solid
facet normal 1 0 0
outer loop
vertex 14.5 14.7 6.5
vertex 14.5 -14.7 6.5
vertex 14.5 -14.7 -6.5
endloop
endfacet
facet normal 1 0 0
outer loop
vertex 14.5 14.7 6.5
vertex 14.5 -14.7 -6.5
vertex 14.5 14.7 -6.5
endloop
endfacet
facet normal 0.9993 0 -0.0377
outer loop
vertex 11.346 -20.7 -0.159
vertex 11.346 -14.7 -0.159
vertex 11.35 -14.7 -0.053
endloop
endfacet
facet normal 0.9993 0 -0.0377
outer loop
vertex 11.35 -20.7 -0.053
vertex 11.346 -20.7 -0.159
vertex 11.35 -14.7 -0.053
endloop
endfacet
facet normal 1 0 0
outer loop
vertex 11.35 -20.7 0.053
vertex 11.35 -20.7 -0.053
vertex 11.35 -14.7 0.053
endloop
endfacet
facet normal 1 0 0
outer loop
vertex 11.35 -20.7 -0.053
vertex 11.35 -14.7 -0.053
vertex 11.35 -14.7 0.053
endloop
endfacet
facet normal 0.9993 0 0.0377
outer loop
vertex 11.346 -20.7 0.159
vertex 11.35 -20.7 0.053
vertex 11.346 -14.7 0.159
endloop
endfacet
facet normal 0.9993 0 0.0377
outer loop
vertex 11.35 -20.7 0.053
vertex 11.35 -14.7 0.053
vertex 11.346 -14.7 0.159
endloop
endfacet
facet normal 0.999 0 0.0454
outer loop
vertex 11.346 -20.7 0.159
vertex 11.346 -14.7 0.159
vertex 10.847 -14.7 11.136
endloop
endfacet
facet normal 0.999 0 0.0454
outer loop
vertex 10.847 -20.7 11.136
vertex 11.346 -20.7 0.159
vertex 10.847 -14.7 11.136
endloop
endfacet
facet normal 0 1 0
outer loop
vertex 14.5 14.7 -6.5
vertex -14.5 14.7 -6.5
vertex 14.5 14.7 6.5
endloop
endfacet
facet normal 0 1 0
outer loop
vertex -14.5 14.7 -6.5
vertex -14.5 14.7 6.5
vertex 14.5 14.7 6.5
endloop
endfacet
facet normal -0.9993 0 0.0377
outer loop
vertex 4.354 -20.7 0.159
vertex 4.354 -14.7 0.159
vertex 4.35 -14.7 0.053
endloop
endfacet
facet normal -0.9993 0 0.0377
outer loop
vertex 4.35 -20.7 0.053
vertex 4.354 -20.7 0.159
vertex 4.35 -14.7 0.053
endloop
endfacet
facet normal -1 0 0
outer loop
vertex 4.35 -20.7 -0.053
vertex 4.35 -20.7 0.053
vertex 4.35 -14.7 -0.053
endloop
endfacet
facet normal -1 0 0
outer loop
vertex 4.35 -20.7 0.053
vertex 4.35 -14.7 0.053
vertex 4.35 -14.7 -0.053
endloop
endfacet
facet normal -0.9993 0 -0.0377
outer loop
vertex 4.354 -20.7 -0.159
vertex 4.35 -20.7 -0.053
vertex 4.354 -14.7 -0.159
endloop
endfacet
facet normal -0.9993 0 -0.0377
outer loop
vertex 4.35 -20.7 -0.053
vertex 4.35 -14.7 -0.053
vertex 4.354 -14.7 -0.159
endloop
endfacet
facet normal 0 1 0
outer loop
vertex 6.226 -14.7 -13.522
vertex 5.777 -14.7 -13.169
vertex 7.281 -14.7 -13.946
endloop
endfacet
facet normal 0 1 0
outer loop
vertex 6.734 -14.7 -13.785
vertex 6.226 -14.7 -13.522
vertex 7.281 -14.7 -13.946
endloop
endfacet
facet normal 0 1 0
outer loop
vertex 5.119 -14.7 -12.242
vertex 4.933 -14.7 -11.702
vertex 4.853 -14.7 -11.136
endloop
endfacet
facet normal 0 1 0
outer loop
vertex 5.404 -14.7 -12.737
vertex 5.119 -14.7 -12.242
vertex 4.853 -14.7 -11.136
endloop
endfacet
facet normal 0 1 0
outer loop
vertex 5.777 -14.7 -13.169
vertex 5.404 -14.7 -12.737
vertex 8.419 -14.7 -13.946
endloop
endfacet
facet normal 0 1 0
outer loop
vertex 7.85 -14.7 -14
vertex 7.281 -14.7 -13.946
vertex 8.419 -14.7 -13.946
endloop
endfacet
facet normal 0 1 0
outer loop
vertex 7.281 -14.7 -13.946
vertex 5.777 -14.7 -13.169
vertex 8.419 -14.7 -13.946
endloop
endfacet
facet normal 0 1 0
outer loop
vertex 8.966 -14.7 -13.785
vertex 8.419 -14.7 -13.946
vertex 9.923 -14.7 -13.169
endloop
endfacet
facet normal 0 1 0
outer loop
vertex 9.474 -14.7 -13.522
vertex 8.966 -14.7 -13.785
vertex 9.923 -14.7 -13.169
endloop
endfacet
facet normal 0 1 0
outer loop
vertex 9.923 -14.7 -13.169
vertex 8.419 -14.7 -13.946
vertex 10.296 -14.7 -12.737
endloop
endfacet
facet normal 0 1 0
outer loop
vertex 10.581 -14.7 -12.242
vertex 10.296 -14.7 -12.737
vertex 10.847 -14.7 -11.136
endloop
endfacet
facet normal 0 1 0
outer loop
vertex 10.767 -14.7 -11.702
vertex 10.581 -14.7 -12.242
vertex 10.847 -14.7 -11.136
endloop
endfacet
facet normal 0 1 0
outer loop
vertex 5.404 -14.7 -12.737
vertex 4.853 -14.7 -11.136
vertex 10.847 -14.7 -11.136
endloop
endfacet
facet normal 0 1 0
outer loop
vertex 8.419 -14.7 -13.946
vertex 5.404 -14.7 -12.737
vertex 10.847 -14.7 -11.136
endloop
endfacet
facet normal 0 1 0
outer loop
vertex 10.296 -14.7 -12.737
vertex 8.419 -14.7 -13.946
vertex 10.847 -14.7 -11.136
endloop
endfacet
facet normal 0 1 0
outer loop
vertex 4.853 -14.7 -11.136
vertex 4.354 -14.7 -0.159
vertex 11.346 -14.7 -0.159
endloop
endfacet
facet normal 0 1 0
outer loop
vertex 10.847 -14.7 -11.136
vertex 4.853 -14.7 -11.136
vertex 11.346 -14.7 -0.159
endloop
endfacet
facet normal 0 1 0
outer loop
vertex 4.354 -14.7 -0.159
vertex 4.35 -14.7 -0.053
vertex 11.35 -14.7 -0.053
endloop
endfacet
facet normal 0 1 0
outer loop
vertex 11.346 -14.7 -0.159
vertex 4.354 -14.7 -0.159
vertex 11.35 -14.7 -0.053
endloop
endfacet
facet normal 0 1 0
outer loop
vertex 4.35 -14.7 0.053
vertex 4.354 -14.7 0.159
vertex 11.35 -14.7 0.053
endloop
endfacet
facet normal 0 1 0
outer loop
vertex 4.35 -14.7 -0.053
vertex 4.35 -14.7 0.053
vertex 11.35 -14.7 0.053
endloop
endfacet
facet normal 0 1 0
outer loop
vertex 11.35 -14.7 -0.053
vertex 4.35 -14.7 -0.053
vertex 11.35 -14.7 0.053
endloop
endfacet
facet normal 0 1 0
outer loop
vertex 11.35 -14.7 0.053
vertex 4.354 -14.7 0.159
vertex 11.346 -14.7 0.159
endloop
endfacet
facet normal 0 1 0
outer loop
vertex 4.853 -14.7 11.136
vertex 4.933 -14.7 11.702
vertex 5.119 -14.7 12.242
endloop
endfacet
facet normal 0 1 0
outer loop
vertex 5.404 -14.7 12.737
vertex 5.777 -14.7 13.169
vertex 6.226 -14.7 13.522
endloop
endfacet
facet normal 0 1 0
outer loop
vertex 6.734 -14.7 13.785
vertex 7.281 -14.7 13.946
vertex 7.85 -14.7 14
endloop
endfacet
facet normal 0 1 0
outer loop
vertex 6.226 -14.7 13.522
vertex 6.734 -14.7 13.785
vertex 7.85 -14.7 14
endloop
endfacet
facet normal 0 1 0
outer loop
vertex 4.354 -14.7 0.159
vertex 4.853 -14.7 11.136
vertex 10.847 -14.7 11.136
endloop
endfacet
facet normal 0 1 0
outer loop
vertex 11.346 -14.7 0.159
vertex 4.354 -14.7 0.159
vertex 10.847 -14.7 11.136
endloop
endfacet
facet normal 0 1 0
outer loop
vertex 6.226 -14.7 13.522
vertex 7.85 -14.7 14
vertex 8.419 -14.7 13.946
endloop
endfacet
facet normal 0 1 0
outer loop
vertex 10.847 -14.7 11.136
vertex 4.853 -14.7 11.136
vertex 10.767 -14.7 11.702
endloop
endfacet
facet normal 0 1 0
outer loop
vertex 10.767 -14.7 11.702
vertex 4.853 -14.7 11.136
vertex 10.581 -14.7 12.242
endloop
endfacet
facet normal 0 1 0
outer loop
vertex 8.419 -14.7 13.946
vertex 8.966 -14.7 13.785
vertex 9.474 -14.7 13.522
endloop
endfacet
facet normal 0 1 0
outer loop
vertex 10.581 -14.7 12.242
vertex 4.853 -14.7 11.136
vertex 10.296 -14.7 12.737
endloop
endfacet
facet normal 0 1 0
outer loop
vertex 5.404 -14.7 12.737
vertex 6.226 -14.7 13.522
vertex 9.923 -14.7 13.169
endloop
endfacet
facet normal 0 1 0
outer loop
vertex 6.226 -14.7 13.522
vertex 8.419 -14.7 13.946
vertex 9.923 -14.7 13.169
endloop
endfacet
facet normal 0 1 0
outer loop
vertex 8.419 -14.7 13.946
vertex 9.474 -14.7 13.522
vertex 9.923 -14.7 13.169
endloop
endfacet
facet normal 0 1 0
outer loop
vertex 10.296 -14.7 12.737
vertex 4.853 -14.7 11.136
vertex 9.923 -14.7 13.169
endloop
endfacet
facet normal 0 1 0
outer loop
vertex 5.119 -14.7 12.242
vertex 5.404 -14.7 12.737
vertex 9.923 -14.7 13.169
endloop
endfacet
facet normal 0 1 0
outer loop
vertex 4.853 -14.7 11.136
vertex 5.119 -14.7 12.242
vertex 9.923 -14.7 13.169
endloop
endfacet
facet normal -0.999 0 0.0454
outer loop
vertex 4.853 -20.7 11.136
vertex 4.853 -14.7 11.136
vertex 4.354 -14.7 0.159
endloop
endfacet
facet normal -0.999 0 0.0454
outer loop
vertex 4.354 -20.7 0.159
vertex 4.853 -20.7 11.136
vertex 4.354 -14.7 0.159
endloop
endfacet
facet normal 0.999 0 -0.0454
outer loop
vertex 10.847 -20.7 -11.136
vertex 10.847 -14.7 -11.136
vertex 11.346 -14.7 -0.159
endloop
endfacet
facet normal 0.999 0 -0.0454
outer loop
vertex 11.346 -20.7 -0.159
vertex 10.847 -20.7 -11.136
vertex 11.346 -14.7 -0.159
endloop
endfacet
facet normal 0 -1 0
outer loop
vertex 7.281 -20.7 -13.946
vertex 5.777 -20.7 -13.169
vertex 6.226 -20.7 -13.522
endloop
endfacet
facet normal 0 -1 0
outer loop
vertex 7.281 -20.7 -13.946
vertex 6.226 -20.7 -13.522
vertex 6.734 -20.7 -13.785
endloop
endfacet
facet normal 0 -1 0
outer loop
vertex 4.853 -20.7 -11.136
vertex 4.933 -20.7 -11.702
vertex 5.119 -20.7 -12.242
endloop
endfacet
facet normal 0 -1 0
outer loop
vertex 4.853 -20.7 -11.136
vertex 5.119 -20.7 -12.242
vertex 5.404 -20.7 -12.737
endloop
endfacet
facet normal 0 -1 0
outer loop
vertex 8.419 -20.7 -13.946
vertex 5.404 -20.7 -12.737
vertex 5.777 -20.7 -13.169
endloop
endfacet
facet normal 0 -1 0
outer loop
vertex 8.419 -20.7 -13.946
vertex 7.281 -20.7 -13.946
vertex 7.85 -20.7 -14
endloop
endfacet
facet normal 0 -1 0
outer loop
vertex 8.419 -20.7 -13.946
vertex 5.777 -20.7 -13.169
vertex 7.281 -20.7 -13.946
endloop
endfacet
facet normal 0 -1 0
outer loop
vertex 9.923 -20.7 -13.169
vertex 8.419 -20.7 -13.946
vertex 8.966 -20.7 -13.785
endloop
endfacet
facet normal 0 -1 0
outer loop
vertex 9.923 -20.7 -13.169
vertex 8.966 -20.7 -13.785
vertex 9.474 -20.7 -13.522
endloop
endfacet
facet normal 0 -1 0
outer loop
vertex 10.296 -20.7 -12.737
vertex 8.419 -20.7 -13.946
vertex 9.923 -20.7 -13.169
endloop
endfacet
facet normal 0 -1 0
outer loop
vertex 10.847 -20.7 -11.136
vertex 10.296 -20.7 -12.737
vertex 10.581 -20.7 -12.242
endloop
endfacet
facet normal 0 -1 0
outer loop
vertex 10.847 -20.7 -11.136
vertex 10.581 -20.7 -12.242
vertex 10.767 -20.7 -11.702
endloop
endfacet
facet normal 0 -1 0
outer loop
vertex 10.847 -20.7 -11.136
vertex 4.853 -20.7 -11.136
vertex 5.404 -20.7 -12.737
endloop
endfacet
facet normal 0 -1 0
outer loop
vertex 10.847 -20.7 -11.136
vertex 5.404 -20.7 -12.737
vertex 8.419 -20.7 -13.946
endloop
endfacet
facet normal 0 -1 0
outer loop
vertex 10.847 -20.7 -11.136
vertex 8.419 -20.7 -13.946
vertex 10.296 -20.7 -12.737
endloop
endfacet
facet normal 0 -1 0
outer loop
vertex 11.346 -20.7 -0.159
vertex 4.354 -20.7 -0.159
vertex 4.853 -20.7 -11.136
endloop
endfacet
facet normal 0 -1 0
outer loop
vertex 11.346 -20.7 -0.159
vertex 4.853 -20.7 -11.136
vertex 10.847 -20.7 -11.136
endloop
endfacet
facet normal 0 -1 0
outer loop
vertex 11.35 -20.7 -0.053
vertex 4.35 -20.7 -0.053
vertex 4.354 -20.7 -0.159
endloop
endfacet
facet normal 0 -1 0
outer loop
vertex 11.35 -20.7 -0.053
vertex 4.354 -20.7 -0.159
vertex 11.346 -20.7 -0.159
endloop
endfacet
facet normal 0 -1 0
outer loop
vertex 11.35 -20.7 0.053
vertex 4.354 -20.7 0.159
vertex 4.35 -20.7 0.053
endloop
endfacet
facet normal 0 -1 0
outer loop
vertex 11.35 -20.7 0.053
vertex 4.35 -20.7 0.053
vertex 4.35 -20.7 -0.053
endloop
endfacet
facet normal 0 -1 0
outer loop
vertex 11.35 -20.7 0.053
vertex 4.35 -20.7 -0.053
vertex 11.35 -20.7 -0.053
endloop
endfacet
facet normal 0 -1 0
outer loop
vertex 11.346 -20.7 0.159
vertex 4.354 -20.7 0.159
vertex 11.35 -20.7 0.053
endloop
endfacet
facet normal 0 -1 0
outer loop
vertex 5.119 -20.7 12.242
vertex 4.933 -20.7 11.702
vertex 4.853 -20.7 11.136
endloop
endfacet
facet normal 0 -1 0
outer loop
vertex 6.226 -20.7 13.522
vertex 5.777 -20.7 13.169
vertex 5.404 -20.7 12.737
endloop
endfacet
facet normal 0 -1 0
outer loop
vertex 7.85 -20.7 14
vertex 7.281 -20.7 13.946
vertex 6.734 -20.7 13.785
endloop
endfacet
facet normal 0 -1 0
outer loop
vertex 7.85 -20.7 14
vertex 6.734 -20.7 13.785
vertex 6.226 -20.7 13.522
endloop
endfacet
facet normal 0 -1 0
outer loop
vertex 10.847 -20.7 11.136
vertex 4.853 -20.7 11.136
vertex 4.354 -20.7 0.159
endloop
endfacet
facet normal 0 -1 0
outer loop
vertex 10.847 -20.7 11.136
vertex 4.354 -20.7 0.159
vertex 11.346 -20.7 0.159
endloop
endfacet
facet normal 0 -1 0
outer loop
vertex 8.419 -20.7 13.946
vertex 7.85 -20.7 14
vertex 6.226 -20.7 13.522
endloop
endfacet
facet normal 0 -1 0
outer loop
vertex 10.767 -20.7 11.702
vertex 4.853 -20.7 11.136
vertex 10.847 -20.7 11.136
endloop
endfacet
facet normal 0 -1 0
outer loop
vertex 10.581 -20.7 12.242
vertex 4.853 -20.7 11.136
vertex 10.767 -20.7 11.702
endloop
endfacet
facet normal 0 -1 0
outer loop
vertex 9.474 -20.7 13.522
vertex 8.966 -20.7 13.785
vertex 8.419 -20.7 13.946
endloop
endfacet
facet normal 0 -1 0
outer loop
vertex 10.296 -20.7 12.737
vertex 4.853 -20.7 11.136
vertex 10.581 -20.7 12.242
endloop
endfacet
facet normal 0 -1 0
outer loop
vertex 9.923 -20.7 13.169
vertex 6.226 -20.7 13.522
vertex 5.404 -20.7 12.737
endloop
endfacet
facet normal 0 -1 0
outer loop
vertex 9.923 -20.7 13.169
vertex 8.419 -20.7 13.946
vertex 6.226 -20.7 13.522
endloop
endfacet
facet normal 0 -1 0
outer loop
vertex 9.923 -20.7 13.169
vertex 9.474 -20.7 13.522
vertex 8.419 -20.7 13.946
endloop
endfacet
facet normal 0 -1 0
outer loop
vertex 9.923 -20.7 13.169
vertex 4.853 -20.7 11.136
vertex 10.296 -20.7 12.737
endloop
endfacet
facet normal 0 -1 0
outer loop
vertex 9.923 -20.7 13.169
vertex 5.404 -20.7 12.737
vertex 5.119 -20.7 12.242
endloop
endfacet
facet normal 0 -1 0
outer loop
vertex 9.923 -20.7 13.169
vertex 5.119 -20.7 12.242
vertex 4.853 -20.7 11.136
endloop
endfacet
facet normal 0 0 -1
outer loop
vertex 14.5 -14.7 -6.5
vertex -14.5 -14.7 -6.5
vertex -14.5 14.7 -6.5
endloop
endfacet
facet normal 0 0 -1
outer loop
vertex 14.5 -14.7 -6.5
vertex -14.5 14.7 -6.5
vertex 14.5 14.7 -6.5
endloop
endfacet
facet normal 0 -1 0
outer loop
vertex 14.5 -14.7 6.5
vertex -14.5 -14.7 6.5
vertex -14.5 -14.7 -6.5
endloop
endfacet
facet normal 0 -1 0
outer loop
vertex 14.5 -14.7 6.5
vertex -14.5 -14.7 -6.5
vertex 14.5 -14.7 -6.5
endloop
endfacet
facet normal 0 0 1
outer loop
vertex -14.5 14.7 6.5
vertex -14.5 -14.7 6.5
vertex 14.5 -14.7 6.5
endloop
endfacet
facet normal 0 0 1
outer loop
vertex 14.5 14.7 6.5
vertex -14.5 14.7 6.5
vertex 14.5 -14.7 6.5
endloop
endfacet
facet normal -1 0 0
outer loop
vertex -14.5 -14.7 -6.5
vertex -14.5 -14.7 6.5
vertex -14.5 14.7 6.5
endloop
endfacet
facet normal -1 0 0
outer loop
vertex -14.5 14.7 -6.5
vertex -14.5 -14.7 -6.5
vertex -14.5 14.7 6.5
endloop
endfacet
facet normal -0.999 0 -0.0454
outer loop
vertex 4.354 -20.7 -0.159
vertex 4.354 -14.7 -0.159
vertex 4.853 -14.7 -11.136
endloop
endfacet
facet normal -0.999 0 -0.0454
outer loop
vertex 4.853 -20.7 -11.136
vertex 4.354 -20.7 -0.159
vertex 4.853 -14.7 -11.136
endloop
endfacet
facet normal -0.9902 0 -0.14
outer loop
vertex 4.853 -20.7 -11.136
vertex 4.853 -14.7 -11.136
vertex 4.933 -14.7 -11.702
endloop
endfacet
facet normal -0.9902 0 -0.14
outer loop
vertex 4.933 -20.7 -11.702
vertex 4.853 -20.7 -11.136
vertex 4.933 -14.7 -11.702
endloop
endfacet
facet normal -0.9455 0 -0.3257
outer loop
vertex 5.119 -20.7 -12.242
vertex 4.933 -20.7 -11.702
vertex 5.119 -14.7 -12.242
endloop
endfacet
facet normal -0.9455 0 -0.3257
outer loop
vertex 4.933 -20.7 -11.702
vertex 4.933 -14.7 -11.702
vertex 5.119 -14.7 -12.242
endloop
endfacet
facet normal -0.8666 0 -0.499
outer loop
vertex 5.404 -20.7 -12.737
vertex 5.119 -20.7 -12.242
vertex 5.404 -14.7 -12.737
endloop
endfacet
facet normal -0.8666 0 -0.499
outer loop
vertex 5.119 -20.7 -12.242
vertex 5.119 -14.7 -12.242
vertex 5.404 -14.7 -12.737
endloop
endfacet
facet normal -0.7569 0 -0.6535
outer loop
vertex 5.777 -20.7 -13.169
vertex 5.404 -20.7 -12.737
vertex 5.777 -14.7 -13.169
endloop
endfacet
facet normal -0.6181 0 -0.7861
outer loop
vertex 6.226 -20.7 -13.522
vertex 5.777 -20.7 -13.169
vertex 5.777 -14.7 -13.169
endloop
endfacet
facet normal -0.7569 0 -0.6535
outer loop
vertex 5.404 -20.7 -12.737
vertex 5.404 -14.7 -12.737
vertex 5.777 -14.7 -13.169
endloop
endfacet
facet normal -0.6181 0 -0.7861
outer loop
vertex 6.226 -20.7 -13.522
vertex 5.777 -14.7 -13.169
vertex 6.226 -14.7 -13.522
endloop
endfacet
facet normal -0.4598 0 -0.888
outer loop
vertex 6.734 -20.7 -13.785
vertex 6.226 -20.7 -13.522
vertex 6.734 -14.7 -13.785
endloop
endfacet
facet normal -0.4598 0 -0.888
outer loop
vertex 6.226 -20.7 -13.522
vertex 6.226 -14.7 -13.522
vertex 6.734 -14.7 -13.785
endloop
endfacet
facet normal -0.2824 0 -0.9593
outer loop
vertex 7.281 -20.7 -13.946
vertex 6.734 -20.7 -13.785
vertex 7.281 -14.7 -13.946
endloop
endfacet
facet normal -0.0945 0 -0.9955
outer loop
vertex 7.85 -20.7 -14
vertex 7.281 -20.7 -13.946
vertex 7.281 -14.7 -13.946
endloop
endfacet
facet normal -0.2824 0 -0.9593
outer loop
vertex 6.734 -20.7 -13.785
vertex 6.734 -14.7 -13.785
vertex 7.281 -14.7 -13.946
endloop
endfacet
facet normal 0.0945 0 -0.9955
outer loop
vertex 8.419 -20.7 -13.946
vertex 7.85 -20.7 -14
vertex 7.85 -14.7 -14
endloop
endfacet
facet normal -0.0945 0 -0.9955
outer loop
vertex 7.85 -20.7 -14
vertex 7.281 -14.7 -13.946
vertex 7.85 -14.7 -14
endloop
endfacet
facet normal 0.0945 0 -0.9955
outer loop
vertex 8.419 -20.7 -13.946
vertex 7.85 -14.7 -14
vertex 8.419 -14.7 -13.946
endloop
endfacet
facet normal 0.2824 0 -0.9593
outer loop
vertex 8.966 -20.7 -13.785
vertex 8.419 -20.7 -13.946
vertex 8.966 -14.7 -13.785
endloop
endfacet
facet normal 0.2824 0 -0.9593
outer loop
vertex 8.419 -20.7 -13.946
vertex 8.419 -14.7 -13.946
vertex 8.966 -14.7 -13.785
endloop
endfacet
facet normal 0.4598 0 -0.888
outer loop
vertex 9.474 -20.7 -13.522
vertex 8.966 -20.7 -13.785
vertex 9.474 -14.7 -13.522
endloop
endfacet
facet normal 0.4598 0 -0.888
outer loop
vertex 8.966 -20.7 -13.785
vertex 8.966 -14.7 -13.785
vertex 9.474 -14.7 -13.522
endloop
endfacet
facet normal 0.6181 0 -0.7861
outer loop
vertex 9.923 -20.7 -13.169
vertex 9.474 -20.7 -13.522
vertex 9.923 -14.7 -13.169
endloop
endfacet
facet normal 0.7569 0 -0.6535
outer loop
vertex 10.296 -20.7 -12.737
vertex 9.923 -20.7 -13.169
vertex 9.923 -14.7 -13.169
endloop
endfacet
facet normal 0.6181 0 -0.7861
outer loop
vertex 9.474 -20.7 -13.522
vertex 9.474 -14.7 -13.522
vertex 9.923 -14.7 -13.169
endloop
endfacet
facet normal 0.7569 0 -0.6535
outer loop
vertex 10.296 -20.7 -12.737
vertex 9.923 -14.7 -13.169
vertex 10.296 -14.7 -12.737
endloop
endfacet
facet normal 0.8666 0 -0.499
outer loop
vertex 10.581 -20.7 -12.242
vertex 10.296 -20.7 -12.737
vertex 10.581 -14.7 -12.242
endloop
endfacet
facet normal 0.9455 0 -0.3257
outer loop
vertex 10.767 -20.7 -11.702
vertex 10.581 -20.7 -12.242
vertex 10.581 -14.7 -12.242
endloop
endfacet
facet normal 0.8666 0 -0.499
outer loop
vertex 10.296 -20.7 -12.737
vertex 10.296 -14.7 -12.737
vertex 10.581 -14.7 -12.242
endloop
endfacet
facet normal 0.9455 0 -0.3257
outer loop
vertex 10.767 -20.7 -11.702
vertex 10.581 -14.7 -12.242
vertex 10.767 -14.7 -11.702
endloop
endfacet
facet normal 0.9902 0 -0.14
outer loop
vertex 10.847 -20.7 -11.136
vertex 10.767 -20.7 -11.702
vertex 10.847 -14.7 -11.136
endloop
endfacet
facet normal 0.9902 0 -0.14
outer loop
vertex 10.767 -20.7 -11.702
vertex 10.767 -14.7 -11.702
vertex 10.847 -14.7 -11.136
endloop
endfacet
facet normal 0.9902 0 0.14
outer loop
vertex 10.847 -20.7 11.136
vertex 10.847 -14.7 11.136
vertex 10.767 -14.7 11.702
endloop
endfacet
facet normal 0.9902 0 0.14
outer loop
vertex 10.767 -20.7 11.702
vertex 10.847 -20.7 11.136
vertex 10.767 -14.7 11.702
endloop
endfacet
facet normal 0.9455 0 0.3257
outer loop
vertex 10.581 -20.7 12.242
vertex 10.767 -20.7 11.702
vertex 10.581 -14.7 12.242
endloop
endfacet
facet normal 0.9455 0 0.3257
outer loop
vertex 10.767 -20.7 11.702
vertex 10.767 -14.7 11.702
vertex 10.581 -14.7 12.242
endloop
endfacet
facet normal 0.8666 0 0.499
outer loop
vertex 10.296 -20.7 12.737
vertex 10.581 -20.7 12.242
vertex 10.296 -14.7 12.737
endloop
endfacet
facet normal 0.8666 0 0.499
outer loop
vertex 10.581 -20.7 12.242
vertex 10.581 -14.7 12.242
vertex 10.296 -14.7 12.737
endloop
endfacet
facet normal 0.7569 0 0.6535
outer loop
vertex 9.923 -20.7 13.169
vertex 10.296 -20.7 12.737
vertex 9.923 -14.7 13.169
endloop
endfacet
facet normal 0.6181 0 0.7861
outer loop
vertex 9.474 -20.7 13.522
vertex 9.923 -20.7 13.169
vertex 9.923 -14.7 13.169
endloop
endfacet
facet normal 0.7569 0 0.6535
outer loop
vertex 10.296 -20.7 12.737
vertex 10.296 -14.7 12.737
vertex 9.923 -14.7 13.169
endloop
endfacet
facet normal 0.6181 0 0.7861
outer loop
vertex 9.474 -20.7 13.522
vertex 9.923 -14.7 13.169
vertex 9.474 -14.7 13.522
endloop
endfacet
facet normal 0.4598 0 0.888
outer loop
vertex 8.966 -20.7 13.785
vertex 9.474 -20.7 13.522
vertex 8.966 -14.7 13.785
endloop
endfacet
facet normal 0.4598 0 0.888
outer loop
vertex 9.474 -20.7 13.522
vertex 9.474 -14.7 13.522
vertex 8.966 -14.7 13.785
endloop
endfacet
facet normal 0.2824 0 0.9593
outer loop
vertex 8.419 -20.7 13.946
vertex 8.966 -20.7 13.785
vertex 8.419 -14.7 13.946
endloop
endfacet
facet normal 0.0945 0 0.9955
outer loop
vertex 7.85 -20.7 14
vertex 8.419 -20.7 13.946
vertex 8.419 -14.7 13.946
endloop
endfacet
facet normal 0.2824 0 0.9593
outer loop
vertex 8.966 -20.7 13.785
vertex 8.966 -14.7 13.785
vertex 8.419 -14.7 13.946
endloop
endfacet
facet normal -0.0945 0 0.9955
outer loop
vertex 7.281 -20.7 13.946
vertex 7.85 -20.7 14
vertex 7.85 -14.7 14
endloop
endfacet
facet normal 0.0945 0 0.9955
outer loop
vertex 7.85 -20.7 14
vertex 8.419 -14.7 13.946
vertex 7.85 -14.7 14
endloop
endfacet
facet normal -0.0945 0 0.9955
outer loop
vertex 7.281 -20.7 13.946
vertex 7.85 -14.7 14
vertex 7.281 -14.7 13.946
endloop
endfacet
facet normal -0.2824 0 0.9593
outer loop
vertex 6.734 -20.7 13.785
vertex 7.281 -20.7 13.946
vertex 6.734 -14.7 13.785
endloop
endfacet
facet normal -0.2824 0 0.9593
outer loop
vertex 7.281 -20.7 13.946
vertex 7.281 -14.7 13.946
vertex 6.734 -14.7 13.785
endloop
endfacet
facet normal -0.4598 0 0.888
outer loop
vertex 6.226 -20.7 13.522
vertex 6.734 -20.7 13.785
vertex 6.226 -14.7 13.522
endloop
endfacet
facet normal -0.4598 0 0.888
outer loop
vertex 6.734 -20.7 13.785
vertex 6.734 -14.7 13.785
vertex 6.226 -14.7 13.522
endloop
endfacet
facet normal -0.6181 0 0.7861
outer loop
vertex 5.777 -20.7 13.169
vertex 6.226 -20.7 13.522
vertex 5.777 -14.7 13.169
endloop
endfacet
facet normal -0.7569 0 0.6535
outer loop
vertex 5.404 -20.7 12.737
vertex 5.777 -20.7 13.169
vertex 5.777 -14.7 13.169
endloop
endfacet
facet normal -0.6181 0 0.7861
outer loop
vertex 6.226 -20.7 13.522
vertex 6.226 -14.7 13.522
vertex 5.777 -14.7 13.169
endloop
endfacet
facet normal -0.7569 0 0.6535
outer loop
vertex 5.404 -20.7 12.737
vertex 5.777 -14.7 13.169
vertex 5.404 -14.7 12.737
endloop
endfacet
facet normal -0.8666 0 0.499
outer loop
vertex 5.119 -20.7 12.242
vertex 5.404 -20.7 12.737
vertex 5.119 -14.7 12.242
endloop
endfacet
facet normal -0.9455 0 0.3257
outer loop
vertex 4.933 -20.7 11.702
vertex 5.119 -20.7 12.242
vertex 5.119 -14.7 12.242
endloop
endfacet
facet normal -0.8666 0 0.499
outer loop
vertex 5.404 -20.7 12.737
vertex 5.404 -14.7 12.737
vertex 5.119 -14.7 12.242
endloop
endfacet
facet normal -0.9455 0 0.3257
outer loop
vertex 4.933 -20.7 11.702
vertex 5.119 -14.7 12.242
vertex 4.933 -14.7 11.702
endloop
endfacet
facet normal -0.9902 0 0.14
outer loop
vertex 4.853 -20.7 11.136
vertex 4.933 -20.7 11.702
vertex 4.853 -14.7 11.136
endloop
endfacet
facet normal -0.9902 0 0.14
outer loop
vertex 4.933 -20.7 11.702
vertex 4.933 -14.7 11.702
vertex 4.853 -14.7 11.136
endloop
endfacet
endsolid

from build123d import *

# Parameters (mm, degrees)
SKETCH1_W           = 29
SKETCH1_H           = 29.4
BOSS_EXTRUDE1_DEPTH = 6.5
BOSS_EXTRUDE2_DEPTH = 6


with BuildPart() as part:
    # Sketch1 → Boss-Extrude1 (new, symmetric)
    with BuildSketch(Plane.XY):
        Rectangle(SKETCH1_W, SKETCH1_H)
    extrude(amount=BOSS_EXTRUDE1_DEPTH, both=True)


with BuildPart() as body_2:
    # Sketch3 → Boss-Extrude2 (new body)
    with BuildSketch(Plane.XZ.offset(14.7)):
        with BuildLine():
            Line((4.353617572, -0.159090909), (4.853100776, -11.136363636))
            ThreePointArc((4.853100776, -11.136363636), (7.85, -14), (10.846899224, -11.136363636))
            Line((10.846899224, -11.136363636), (11.346382428, -0.159090909))
            ThreePointArc((11.346382428, -0.159090909), (11.35, 0), (11.346382428, 0.159090909))
            Line((11.346382428, 0.159090909), (10.846899224, 11.136363636))
            ThreePointArc((10.846899224, 11.136363636), (7.85, 14), (4.853100776, 11.136363636))
            Line((4.853100776, 11.136363636), (4.353617572, 0.159090909))
            ThreePointArc((4.353617572, 0.159090909), (4.35, 0), (4.353617572, -0.159090909))
        make_face()
    extrude(amount=BOSS_EXTRUDE2_DEPTH)


solid = Compound([part.part, body_2.part])
